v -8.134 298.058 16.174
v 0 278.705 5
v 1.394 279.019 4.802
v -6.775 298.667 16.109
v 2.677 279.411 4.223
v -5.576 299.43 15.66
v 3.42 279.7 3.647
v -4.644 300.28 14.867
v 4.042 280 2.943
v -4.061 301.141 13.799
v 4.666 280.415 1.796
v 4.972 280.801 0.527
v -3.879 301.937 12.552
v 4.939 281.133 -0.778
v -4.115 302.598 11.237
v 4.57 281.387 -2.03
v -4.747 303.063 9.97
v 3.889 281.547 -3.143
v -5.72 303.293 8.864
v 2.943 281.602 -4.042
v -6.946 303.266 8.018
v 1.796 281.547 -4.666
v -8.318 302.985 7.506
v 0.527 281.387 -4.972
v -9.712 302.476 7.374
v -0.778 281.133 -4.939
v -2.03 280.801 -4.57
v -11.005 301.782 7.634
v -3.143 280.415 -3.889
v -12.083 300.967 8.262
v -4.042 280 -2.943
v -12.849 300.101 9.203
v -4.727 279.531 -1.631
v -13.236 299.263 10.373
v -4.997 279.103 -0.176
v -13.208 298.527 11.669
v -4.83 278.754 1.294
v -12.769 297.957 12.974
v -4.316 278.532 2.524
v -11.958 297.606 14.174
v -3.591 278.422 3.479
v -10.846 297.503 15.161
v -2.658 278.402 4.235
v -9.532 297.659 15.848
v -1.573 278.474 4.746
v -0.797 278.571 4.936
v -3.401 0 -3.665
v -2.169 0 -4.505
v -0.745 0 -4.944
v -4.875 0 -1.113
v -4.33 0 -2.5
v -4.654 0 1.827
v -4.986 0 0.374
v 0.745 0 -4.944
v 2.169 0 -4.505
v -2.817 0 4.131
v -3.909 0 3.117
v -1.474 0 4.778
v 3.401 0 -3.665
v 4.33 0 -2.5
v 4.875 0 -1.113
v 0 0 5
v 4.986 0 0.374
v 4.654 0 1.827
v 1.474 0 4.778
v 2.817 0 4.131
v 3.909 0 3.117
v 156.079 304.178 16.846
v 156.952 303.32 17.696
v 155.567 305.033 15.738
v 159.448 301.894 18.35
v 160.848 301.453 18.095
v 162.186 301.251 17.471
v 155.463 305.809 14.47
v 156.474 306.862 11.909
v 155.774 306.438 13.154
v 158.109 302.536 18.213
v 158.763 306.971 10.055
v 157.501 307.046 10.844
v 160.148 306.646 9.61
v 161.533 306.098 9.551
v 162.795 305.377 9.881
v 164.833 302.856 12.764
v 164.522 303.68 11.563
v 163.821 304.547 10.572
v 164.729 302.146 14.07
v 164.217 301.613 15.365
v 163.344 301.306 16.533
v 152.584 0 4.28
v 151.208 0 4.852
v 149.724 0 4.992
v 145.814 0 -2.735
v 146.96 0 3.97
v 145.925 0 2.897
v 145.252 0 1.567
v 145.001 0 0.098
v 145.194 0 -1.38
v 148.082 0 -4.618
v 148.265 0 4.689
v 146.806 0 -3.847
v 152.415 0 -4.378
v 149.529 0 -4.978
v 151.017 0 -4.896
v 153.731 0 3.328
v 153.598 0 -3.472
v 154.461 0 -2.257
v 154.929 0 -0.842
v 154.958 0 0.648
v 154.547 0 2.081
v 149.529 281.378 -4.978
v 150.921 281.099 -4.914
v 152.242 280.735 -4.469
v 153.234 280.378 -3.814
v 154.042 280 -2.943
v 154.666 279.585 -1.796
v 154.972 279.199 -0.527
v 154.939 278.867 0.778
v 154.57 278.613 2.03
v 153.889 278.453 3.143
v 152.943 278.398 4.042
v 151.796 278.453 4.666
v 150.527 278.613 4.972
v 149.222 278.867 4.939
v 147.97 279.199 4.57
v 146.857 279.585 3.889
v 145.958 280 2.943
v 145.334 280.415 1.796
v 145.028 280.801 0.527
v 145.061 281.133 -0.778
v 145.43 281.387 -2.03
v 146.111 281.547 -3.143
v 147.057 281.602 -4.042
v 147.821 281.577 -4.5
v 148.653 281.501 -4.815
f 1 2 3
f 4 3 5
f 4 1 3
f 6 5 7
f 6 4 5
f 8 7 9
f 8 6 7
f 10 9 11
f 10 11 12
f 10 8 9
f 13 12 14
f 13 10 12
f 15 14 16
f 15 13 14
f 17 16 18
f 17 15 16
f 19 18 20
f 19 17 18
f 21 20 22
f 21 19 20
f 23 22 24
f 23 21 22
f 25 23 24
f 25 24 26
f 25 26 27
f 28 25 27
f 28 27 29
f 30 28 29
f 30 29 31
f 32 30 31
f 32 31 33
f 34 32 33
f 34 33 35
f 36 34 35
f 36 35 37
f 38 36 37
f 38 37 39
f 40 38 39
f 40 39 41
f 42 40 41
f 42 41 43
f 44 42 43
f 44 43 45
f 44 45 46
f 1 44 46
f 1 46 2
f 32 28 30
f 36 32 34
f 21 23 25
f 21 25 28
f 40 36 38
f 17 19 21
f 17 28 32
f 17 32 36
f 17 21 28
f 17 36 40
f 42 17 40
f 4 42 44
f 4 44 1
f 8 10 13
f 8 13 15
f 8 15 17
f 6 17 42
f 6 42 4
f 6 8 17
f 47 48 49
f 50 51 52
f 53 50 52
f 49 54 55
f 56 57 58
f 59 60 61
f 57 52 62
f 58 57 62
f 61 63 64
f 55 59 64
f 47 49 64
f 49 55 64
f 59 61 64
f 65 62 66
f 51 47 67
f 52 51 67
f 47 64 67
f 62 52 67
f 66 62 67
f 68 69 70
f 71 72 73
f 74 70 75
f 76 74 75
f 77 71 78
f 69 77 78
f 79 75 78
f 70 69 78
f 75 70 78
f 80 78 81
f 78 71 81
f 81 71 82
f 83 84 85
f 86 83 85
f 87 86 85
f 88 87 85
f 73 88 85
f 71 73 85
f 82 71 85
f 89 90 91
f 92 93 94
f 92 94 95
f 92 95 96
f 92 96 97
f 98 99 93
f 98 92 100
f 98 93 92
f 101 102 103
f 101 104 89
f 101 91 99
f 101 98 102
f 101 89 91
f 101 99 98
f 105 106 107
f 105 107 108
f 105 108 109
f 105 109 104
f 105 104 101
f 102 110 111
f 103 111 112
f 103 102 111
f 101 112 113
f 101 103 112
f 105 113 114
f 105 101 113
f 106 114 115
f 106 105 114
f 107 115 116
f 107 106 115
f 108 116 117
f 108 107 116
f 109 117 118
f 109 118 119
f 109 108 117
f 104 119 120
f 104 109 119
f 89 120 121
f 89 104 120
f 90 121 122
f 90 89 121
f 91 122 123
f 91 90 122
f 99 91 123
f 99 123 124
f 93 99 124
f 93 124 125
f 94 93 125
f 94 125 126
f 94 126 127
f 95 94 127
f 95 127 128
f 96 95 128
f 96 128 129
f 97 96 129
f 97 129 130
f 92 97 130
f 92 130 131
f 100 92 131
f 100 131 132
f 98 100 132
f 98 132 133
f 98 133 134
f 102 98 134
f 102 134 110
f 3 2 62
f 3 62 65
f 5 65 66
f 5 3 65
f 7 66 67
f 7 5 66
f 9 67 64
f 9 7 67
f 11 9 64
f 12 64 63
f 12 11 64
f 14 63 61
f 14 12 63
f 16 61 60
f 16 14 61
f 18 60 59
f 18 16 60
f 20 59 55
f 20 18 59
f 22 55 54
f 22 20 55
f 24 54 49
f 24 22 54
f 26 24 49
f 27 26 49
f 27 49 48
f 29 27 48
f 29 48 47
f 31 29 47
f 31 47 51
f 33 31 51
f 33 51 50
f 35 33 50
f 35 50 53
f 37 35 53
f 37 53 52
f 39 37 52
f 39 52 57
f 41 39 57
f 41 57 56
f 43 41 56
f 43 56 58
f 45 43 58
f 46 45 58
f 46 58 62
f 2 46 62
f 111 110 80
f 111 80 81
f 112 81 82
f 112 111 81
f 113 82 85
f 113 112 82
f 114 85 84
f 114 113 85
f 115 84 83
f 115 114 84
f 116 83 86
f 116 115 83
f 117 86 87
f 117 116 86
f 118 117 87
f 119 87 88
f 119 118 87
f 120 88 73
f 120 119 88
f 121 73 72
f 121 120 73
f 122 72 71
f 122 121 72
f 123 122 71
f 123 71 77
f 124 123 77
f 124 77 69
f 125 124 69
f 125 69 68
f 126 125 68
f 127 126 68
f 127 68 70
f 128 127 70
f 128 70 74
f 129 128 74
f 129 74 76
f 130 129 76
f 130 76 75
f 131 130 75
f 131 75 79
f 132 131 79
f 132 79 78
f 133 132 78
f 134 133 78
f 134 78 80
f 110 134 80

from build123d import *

# Parameters (mm, degrees)
SWEEP_4_PROFILE_R = 5
SWEEP_5_PROFILE_R = 5


with BuildPart() as part:
    # 扫描4: sweep along a path in 草图90
    with BuildLine(Plane(origin=(98.045795282, 0, -71.371502155), x_dir=(-0.5885247359201105, 0, -0.8084792113654897), z_dir=(0.8084792113654897, 0, -0.5885247359201105))) as sweep_4_path:
        Line((-105.521590911, 304.145672377), (-88.278710388, 280))
        Line((-88.278710388, 280), (-88.278710388, 0))
    # 扫描4 profile (on start of the path) → 扫描4 (sweep)
    with BuildSketch(Plane(origin=(160.147861706, 304.145672377, 13.940510447), x_dir=(0, 0.5000000000000007, -0.8660254037844384), z_dir=(-0.34202014332567265, -0.8137976813493721, -0.4698463103929541))):
        Circle(SWEEP_4_PROFILE_R)
    sweep(path=sweep_4_path.line, transition=Transition.RIGHT)


with BuildPart() as body_2:
    # 扫描5: sweep along a path in 草图91
    with BuildLine(Plane(origin=(0, 0, 0), x_dir=(0.5885247359201103, 0, -0.80847921136549), z_dir=(0.8084792113654898, 0, 0.5885247359201102))) as sweep_5_path:
        Line((0, 0), (0, 280))
        Line((0, 280), (-14.573448455, 300.407594389))
    # 扫描5 profile (on start of the path) → 扫描5 (sweep)
    with BuildSketch(Plane.ZX):
        Circle(SWEEP_5_PROFILE_R)
    sweep(path=sweep_5_path.line, transition=Transition.RIGHT)


solid = Compound([part.part, body_2.part])
